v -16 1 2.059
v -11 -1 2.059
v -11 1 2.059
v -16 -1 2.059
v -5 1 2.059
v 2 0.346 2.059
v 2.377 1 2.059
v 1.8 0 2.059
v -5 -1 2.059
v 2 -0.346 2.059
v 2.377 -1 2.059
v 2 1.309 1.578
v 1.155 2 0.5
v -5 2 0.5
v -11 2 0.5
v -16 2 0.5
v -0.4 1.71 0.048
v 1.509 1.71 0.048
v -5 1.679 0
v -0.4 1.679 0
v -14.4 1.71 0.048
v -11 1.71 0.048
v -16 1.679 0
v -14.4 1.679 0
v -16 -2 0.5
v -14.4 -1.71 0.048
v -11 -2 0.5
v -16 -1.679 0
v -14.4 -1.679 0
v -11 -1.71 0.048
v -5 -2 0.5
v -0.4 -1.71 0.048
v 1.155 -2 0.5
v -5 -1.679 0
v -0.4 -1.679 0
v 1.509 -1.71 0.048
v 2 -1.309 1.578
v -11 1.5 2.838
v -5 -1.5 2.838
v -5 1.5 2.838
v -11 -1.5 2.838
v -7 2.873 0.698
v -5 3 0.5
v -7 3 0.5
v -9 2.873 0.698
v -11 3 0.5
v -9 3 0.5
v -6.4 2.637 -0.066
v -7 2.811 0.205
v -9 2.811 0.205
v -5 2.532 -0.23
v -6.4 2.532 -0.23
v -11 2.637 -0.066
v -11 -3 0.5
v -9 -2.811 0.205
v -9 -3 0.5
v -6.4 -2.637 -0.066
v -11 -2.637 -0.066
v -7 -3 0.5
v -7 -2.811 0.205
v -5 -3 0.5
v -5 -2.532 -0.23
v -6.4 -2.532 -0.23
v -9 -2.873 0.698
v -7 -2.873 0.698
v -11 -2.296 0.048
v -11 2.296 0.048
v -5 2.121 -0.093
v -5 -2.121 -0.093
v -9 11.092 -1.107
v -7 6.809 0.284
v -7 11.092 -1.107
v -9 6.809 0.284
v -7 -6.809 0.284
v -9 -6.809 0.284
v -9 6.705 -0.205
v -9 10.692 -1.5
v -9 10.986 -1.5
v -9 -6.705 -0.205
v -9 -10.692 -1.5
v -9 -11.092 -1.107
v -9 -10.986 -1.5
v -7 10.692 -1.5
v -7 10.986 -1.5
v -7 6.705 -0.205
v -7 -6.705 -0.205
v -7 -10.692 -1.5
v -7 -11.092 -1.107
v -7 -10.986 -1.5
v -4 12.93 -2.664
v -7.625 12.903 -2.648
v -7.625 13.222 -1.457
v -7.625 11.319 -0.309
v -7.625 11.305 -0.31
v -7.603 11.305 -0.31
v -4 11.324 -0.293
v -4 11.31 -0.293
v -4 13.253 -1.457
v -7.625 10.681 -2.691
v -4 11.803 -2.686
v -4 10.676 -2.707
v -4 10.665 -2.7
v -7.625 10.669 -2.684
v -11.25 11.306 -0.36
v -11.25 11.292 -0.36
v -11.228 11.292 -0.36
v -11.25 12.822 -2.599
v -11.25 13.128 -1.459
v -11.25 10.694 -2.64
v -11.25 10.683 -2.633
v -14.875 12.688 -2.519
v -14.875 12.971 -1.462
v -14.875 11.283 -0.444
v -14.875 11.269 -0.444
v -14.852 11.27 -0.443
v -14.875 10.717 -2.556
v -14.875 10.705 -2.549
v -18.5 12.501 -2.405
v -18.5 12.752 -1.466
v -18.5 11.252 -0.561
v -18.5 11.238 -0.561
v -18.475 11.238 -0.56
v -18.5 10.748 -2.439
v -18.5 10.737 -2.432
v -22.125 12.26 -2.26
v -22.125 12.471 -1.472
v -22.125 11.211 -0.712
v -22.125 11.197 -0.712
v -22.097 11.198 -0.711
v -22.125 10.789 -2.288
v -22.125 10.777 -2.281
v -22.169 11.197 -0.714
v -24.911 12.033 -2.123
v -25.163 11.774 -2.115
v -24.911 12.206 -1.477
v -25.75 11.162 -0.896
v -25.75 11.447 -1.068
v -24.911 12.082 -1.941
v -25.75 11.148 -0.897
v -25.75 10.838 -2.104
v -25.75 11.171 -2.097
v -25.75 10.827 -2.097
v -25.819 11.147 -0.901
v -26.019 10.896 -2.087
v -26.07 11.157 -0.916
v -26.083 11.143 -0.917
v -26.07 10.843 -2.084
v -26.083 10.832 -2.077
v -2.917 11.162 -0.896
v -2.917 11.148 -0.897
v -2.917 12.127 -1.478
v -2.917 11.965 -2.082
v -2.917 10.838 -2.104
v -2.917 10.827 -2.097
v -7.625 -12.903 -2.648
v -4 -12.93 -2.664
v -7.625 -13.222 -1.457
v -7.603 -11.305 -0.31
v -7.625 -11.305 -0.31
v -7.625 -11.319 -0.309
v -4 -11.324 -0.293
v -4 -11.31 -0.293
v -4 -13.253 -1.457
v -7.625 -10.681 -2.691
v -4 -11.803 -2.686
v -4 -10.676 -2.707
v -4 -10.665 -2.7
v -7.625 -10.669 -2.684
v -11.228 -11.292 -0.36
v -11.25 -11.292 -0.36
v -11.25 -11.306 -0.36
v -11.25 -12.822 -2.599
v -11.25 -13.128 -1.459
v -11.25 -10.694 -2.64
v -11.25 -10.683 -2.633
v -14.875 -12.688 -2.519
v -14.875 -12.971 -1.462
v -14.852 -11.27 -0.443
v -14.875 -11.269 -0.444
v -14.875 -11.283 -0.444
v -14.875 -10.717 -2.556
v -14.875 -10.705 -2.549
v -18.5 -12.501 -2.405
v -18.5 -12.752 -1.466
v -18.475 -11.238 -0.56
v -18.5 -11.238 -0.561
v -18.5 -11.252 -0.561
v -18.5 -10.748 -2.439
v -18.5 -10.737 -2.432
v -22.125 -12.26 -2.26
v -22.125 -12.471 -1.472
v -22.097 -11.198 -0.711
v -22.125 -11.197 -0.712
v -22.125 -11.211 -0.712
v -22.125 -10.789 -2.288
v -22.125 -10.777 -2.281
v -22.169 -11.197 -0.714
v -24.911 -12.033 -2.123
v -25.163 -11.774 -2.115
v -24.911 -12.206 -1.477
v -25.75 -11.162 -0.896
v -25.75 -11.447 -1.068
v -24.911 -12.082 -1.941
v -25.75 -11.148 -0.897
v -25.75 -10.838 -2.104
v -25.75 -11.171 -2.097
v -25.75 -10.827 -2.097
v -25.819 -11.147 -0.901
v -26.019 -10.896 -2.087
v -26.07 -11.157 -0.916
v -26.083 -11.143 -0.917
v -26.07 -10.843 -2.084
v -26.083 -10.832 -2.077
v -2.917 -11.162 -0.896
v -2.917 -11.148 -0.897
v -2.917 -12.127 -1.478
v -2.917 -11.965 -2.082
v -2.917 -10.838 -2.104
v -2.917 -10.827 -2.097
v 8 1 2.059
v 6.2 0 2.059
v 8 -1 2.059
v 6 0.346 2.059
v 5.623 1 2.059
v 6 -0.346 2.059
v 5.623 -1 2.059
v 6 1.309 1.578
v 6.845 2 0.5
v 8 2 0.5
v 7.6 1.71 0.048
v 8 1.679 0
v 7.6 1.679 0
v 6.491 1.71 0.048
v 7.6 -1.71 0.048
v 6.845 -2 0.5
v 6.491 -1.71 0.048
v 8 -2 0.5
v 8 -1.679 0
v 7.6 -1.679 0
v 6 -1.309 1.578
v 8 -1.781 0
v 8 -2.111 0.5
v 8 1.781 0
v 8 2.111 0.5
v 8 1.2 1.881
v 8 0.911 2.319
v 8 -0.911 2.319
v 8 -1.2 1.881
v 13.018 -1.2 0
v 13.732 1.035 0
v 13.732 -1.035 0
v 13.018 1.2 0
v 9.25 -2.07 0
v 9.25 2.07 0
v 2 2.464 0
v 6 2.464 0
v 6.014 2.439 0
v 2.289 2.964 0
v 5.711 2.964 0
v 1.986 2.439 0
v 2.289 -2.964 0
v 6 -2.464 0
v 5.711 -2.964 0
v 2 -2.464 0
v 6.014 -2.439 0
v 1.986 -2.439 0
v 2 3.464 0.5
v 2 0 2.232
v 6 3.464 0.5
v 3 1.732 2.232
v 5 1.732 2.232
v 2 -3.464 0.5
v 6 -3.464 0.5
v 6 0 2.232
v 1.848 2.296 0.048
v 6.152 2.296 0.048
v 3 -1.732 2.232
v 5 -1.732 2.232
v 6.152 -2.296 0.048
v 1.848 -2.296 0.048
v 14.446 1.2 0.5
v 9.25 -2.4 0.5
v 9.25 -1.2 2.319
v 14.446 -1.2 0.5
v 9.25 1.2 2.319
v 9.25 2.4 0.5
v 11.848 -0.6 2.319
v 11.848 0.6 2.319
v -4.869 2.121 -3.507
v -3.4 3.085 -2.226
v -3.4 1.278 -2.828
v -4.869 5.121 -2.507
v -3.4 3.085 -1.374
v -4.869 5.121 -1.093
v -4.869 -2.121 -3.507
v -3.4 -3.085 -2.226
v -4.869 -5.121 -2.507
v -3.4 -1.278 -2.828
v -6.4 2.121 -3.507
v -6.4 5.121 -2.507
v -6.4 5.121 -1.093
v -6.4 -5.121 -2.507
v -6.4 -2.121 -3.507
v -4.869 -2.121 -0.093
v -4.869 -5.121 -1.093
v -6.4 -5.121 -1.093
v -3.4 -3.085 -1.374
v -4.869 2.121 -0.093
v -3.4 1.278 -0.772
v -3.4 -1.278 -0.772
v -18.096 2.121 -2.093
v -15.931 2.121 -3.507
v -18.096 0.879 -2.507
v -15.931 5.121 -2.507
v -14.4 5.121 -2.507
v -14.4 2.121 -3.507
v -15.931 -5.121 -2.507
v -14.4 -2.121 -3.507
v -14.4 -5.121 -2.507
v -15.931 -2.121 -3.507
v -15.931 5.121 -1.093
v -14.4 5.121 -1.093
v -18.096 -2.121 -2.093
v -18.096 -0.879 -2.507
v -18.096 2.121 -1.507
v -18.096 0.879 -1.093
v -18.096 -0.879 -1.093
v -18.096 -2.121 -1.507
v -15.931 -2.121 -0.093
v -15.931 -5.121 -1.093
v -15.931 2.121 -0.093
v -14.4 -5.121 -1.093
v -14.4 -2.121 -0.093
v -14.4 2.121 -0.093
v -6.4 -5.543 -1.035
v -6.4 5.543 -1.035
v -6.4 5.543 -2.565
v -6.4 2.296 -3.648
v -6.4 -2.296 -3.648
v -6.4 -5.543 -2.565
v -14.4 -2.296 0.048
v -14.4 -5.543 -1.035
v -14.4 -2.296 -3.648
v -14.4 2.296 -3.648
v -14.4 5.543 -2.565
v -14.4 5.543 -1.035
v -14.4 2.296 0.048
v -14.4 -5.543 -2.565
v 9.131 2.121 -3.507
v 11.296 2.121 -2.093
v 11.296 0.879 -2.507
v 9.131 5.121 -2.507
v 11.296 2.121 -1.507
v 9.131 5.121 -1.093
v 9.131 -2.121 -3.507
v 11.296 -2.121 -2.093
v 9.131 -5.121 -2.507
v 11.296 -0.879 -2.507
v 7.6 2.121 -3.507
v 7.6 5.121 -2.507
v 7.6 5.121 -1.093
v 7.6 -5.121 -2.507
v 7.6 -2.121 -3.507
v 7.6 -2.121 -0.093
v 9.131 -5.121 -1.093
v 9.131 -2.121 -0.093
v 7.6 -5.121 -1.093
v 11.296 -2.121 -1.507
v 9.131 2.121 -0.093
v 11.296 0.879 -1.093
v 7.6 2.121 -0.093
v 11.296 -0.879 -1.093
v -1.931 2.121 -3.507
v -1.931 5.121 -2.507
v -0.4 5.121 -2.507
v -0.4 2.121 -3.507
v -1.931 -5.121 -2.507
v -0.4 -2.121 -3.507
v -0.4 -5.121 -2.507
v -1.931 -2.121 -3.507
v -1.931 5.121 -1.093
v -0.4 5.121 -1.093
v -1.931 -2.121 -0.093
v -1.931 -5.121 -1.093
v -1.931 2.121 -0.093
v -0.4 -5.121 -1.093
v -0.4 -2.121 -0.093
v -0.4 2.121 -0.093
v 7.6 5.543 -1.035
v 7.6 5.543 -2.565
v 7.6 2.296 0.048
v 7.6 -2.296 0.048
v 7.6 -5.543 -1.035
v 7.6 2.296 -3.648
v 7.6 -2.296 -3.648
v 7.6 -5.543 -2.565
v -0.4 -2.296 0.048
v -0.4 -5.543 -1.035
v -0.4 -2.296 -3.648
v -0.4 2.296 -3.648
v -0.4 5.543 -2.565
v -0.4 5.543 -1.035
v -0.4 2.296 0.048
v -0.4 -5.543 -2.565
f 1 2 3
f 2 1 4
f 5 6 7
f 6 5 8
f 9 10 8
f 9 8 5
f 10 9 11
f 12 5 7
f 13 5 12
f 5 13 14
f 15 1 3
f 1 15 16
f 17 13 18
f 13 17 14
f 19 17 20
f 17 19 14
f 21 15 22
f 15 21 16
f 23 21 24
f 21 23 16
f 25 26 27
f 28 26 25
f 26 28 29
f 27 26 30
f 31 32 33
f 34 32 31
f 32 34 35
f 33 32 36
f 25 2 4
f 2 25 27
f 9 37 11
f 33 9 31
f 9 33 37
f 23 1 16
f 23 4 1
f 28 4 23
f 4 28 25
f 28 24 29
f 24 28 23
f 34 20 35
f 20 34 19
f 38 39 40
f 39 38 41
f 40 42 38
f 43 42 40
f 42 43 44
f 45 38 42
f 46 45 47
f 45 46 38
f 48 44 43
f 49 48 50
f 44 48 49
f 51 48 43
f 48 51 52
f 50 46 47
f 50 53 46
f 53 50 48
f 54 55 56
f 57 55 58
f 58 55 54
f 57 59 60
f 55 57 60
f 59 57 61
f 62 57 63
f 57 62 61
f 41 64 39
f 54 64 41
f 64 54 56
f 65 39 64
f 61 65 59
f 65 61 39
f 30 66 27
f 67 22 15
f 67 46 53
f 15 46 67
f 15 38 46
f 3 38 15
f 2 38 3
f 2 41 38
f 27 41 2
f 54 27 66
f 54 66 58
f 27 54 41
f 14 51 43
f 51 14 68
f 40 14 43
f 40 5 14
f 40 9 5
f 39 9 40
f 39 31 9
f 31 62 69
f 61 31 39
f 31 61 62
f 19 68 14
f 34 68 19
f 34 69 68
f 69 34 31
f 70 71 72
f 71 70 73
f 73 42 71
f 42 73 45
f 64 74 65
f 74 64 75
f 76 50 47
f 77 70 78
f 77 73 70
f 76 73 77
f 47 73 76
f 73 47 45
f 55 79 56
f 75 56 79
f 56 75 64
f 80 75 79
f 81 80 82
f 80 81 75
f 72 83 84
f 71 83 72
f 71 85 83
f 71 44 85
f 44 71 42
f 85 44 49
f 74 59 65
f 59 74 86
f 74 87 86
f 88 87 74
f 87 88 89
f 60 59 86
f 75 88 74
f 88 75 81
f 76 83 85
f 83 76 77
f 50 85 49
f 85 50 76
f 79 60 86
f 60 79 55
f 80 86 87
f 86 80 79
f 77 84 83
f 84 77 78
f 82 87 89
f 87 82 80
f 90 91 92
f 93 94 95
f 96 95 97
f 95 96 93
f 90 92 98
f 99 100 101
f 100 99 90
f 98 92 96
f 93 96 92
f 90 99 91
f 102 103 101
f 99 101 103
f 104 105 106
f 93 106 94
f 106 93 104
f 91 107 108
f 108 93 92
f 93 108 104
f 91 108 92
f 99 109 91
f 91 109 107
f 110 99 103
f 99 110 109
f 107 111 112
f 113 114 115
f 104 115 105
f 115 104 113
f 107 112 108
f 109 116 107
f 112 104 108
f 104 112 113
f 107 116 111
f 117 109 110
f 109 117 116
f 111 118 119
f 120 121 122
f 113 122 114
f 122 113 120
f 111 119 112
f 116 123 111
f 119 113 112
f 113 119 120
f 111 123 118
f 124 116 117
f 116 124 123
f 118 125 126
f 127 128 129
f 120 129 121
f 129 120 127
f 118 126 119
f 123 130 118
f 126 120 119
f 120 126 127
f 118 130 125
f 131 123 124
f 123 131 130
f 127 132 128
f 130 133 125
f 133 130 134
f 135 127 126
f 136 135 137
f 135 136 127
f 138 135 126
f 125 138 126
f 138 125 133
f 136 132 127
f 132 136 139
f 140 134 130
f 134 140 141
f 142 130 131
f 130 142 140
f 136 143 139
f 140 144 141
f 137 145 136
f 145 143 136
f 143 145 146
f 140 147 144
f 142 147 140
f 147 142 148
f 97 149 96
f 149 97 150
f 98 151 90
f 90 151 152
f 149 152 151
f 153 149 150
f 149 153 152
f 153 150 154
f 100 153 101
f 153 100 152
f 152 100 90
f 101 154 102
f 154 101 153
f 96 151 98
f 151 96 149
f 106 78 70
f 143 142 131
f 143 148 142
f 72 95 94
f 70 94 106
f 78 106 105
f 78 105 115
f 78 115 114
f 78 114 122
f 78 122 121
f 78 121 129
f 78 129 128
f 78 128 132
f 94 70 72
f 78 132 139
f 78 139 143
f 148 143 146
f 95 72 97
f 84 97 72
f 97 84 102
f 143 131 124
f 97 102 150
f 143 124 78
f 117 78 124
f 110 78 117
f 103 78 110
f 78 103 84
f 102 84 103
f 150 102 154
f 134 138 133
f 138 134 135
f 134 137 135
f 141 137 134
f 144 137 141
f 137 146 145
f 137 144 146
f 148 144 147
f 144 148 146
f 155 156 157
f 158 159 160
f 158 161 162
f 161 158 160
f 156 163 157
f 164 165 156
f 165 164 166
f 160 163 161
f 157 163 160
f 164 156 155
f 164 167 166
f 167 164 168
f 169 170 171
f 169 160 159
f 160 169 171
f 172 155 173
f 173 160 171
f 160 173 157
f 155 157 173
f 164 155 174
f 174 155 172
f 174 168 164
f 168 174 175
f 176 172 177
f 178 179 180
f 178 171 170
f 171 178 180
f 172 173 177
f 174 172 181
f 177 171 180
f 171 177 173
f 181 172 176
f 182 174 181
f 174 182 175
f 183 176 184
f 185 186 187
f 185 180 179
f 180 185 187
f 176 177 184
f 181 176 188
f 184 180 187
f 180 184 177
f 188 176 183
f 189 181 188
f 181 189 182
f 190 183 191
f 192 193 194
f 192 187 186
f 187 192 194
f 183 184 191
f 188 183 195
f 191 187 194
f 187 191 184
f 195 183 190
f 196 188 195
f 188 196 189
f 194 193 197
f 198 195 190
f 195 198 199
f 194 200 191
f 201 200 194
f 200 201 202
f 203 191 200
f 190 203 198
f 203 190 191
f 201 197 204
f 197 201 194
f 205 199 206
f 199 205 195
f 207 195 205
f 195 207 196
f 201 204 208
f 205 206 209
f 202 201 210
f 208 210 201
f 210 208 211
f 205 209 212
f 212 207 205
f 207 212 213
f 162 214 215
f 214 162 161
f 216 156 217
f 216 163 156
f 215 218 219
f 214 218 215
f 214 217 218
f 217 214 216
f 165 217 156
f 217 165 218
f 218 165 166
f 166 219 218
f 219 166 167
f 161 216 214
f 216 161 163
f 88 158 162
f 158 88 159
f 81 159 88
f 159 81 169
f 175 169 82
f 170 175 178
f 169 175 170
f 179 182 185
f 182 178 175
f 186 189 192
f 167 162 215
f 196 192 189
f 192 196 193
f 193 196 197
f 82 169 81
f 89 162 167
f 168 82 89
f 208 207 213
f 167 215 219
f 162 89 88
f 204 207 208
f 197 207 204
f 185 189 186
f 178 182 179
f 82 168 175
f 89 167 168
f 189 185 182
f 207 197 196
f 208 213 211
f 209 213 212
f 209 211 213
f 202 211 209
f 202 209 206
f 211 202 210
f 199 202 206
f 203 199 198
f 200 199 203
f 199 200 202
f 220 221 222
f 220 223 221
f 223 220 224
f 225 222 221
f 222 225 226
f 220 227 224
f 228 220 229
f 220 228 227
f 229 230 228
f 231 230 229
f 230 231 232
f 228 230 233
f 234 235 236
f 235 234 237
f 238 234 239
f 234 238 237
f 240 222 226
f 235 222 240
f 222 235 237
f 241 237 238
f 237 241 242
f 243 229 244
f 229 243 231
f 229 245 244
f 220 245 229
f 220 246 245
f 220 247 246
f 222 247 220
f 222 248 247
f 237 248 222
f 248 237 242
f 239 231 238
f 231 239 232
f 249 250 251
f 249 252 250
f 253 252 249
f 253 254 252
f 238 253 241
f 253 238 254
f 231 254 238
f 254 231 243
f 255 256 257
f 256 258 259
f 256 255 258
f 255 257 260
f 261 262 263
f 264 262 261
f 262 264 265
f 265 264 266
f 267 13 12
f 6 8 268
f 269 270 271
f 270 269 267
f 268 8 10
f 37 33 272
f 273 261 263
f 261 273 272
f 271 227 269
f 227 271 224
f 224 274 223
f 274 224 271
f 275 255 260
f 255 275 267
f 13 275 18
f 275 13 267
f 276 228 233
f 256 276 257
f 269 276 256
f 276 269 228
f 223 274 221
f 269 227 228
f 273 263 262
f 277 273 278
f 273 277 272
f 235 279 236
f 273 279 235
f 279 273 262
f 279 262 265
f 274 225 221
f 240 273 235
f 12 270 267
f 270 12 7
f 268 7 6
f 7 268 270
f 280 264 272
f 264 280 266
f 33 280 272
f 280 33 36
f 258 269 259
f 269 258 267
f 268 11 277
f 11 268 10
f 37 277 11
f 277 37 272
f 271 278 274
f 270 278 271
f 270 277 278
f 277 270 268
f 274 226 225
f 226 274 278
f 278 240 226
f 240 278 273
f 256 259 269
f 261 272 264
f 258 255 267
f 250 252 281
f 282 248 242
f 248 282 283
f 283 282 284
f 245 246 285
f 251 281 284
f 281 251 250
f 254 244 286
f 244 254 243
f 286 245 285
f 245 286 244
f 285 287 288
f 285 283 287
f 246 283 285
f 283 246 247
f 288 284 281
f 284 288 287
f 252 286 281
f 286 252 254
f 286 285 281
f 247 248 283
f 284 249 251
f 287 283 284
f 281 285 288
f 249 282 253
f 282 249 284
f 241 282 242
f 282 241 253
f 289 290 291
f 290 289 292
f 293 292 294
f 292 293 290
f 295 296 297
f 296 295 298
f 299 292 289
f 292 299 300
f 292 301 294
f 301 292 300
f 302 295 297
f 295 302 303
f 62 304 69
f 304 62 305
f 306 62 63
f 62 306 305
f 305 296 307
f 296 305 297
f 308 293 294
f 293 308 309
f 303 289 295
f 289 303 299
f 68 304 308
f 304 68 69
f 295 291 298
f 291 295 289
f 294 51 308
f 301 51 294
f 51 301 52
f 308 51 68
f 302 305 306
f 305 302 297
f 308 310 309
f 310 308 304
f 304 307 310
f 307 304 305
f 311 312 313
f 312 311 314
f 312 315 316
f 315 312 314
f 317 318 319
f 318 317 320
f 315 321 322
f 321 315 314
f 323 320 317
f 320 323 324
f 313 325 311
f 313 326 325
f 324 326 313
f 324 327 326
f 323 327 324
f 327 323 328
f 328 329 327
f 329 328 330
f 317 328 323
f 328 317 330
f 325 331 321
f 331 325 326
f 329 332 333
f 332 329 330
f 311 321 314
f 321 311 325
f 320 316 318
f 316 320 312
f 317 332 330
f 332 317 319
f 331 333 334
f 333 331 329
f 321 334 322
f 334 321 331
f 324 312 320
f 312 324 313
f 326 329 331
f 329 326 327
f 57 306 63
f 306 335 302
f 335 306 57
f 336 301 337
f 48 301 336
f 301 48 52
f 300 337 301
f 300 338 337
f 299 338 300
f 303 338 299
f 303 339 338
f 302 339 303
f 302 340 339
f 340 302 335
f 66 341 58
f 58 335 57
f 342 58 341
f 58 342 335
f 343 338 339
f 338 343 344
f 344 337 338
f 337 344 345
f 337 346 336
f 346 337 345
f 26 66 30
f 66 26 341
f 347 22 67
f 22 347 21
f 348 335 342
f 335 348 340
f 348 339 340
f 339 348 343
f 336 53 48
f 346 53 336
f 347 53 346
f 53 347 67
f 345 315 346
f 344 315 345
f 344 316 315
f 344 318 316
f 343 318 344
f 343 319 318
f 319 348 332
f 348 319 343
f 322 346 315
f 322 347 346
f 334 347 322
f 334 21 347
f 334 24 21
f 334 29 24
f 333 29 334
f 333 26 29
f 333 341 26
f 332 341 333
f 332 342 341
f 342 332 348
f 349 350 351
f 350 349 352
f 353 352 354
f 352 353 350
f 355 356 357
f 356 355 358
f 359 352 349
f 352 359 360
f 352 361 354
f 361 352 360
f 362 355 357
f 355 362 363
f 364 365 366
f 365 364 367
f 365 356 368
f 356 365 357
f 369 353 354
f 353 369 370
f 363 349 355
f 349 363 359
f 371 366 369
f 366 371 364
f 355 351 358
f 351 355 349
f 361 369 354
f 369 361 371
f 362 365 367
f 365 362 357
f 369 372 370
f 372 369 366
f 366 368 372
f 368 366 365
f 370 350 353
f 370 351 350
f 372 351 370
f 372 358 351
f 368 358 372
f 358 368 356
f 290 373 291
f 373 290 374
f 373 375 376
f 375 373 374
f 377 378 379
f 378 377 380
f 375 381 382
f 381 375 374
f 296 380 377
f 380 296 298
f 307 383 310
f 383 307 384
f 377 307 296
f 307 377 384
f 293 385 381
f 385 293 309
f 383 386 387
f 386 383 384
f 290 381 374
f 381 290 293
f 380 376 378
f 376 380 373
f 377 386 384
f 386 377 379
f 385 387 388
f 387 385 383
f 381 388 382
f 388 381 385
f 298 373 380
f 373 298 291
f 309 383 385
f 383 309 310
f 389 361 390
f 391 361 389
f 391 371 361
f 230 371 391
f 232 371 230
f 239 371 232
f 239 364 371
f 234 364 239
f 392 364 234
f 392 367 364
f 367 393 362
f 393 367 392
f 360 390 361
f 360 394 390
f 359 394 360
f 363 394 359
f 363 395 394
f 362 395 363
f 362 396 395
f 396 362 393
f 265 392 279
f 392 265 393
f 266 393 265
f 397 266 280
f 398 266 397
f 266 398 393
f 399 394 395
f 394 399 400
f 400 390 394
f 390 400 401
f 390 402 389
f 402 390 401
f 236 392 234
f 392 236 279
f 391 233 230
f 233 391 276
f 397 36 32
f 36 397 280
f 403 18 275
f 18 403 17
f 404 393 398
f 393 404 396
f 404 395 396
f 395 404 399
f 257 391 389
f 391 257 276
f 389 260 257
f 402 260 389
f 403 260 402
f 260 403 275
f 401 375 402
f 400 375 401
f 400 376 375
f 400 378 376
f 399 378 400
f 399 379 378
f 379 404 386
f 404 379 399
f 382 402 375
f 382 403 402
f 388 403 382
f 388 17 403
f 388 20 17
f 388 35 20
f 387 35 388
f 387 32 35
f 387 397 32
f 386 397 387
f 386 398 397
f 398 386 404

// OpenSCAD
// file: ../lib/util.scad
fn1 = 32;
fn2 = 16;

module util_half_sphere(radius, fn=fn1) {
    difference() {
        sphere(radius, $fn=fn);
        translate([0,0,-(radius+radius/19)])
            cube(2*radius+radius/10, center=true);
    }
}

function gcd(a,b) = a == b ? a : a > b ? gcd(a-b, b) : gcd(a, b-a);

module util_saucer(length, width, height, fn=fn1) {
    rad = gcd(length,gcd(width,height));
    //rad = 10;
    scale([length/(2*rad), width/(2*rad), height/rad])
        util_half_sphere(rad, fn);
}

module util_half_cylinder(length, radius, inner_fn=fn2, outer_fn=fn1) {
    maxval = max(length, 2*radius);
    intersection() {
        difference() {
            rotate([0,90,0])
                translate([0,0,-(length/2 + length/20)])
                    cylinder(length+length/10, radius, radius, $fn=inner_fn);
            
            translate([0,0,(maxval/2 + maxval/19)])
                cube(maxval+maxval/10, center=true);
        }
        
        translate([0,0,-(radius+radius/20)])
            cylinder(radius + radius/10, length/2, length/2, $fn=outer_fn);
    }
}

module util_body(length, width, height, upper_height, fn=fn1) {
    rad = gcd(length, gcd(width, upper_height));
    
    scale(.995) scale([length/(2*rad), width/(2*rad), 1])
        util_half_cylinder(2*rad, height, outer_fn=fn);
}

module util_graded_cylinder(height, radius_start, radius_end, grades=1, fn=fn1) {
    height_grade = height / grades;
    radius_grade = (radius_start - radius_end) / (grades * grades);
    for (i = [0 : 1 : grades]) {
        translate([0,0,i*height_grade])
            cylinder(height_grade, 
                     radius_start - i*radius_grade * i,
                     radius_start - (i+1) * radius_grade * (i+1),
                     $fn = fn);
    }
}

module util_nacelle(length, width, height, curved=false, up=true, front_bulge=false) {
    rad = min(width, height/2);
    grads = curved ? 6 : 1;
    scale_factor = front_bulge ? 1.1 : 1;
    direction = up ? -1 : 1;
    difference() {
        scale([1, width/ (2*rad), height/rad])
            difference() {
                union() {
                    rotate([0,-90,0])
                        rotate(30)
                            util_graded_cylinder(length-rad, rad, rad/2, grads, 6);
                    scale(scale_factor) 
                        rotate([0,90,0]) rotate(90) sphere(rad, $fn=6);
                }
                
                translate([-length/2, 0, direction * (height/2 + height/19)])
                    cube([length+length, width+width, height+height/10], center=true);
            }
        
        translate([-length-(curved?length/3:0), 0, -length/3])
            rotate([0,-45,0])
                cube(length, center=true);
    }
}

module util_mirrored(v) {
    children();
    mirror(v) children();
}

module util_ring(outer, inner, height) {
    difference() {
        translate([0,0,-height/2])
            cylinder(height, outer, outer);
        translate([0,0,-(height/2 + height/19)])
            cylinder(height+height/10, inner, inner);
    }
}

module util_star(radius, thick, num, half=false) {
    angle = 360/num;
    offset = half? angle/2 : 0;
    for (i = [0: 1: num]) {
        rotate(i* angle + offset)
            translate([radius/2,0,0])
                cube([radius, thick, thick], center=true);
    }
}

module util_ring_star(radius, thick, num, inner, half=false) {
    outer=inner+thick;
    avg = (inner + outer)/2;
    union() {
        difference() {
            util_star(radius, thick, num, half);
            cylinder(2*thick, outer, outer, $fn=num, center=true);
        }
        util_ring(outer, inner, thick);
    }
}

module util_hangar_disk(height, lower, upper, num, fn=fn1) {
    difference() {
            cylinder(height, lower, upper, $fn=fn, center=true);
        difference() {
            scale([1,1,22])
                util_star(1.1*upper, height/20, num, half=true);
            scale(.95)
                cylinder(height, lower, upper, $fn=fn, center=true);
        }
    }
}

module util_hangar_form(length, width, height, num, inner=0) {
    l = 0.6* max(length, width);
    h = 2.5* height;
    thick = min(height/20,1);
    inner = inner == 0 ? l/3 : inner;
    difference() {
        children();
        scale([1,1,h/thick]) 
            util_ring_star(l, thick, num, inner, half=true);
    }
    scale(.95) children();
}

module util_nacelle_bar(span, height, width, thickness) {
    rad = (span*span/(8*height) + height/2);
    outer = rad + thickness/2;
    inner = rad - thickness/2;
    difference(){
        translate([0,0,outer])
            rotate([0,90,0])
                util_ring(outer, inner, width);
    
        translate([0,0,1.1*outer+height])
            cube(2.2*outer, center=true);
    }
}

module util_q_sphere(rad, quadrant) {
    x_sign = quadrant == 1 ? 1 :
             quadrant == 2 ? -1 :
             quadrant == 3 ? -1 :
             quadrant == 4 ? 1 : 0;
    z_sign = quadrant == 1 ? 1 :
             quadrant == 2 ? 1 :
             quadrant == 3 ? -1 :
             quadrant == 4 ? -1 : 0;
    
    difference() {
        sphere(rad, $fn=32);

        translate([x_sign*-1.1*rad + .01,0,0])
        cube(2.2*rad, center=true);

        translate([0,0,z_sign*-1.1*rad + .01])
        cube(2.2*rad, center=true);
    }
}

module util_ovoid(front_rad, back_rad, width, upper_rad, lower_rad) {
    half_width = width/2;
    largest=max(front_rad, back_rad, half_width, upper_rad, lower_rad);
    smallest=min(front_rad, back_rad, half_width, upper_rad, lower_rad);
    
    union() {
        scale([front_rad/smallest, half_width/smallest, upper_rad/smallest])
        util_q_sphere(smallest, 1);
        
        scale([front_rad/smallest, half_width/smallest, lower_rad/smallest])
        util_q_sphere(smallest, 4);
        
        scale([back_rad/smallest, half_width/smallest, lower_rad/smallest])
        util_q_sphere(smallest, 3);
        
        scale([back_rad/smallest, half_width/smallest, upper_rad/smallest])
        util_q_sphere(smallest, 2);
    }
}
// file: macs.scad
use <../lib/util.scad>;



module macs_pod_diff() {
    translate([0,0,-(6+.5)])
        cube(12, center=true);

    translate([-(3+1.25),0,0])
        cube(6, center=true);
}

module macs_pod() {
    difference() {
        scale([1,.4,.35])
            rotate(90)
                sphere(6, $fn=6);
        macs_pod_diff();
    }
    
    //macs_pod_wing();
}

module macs_small_nacelle() {
    util_nacelle(7.5,1,1,curved=true, up=false);
}


module macs_pod_wing() {
    translate([-1,0,0])
        rotate([0,90,0])
            scale([.1,1,1])
                cylinder(2, 3.5, 2.75, $fn=6);
}

module macs_small_warp() {
    macs_corridor(4);

    translate([0,0,1.5])
        mirror([0,0,1])
            scale([1,1.2,0.8])
                util_nacelle_bar(7.5,2,2,.15);

    util_mirrored([0,1,0])
        translate([3,4.2,0])
            macs_small_nacelle();
    
    translate([0,0,1.5])
        rotate([0,90,0]) {
            translate([0,0,1.5]) sphere(.5, $fn=8);
            cylinder(3,.5,.5, center=true, $fn=8);
            translate([0,0,-1.5]) sphere(.5, $fn=8);
        }
}




module macs_extra_room() {
     macs_corridor(8);

     difference() {
         scale([1,1,.5])
            sphere(4, $fn=6);


        translate([0,0,-(6+.5)])
            cube(12, center=true);
    }
}


module macs_corridor(length) {
    difference() {
        scale([1,1,.9])
            rotate([0,-90,0])
                rotate(90)
                    cylinder(length,2,2,$fn=6, center=true);
        translate([0,0,-(length*1.1/2 +.5)])
            cube(length*1.1, center=true);
    }
}

module macs_large_nacelle() {
    util_nacelle(23,2.5,2.5,curved=true,up=false);
}

module macs_large_warp(up=false) {
    macs_corridor(16);
    scale(1.5) macs_corridor(4);
    translate([0,0,.5]) {
        if(up) {
            util_nacelle_bar(25,2.5,2,.5);
        }
        else {
            mirror([0,0,1]) util_nacelle_bar(25,2.5,2,.5);
        };
    };
    
    if (up) {
        util_mirrored([0,1,0]) 
            translate([4,11,2.5]) 
                rotate([105,0,0])
                    macs_large_nacelle();
    } else {
        util_mirrored([0,1,0]) 
            translate([4,11,-2]) 
                rotate([75,0,0])
                    macs_large_nacelle();
    };
}



module macs_box() {
    scale([1,1.5,.5]) {
        rotate([0,90,0])
            rotate(180/8)
                cylinder(8,4,4, $fn=8, center=true);

        util_mirrored([1,0,0])
            translate([4,0,0])
                rotate([0,90,0])
                    rotate(180/8)
                        sphere(4, $fn=8);
    }
}



module macs_double_box() {
    union() {
        translate([-7,0,0]) macs_box();
        translate([7,0,0]) macs_box();
    }
}


module macs_disk(radius) {
    util_hangar_form(radius*2,radius*2,2,4,3) union () {
        translate([0,0,2]) cylinder(0.25, radius, radius-.5, center=true);
        cylinder(3.5, radius, radius, center=true);
        translate([0,0,-2]) cylinder(0.25, radius-.5, radius, center=true);
    }
    cylinder(4.5, 3,3, center=true);
}


module macs_cargo_element() {
    rotate([0,90,0]) scale([1,1,2]) macs_disk(6);
}

module macs_large_cargo() {
    translate([28,0,0]) macs_cargo_element();
    translate([20,0,0]) macs_cargo_element();
    translate([12,0,0]) macs_cargo_element();
    translate([4,0,0]) macs_cargo_element();
    translate([-4,0,0]) macs_cargo_element();
    translate([-12,0,0]) macs_cargo_element();
    translate([-20,0,0]) macs_cargo_element();
    translate([-28,0,0]) macs_cargo_element();

    translate([20,0,0]) cylinder(6.6,3,3);
    translate([-20,0,0]) cylinder(6.6,3,3);
}

    
// main file
use <macs.scad>;



module macs_heavy_runabout() {
    union () {
        translate([-8,0,.5]) macs_large_warp();
        translate([4,0,.5]) macs_extra_room();
        translate([8+1.25,0,.5]) macs_pod();
        translate([-7.4+4,0,-1.8]) macs_double_box();
        //translate([-16-1.25,0,.5]) mirror([1,0,0]) macs_pod();
    }
}

macs_heavy_runabout();
